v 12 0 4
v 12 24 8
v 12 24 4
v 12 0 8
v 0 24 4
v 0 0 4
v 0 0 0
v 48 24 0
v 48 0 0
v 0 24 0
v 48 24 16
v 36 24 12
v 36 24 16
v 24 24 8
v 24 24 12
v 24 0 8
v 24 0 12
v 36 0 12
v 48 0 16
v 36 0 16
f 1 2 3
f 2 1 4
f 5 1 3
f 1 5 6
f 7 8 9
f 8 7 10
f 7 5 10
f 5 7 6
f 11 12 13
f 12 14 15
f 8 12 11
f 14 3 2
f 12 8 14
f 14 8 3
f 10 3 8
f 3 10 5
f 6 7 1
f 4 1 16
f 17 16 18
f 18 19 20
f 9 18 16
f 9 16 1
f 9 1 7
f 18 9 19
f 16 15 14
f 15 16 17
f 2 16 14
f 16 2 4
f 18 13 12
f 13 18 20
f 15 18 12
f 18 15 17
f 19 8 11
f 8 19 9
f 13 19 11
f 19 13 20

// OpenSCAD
// SPDX-License-Identifier: CC-BY-4.0
// Original design: OpenPrintLab contributors. Units: mm.
// Generated inspection snapshot; edit models/recipes.py and catalog.json to customize.
// https://github.com/Prashanth261993/OpenPrintLab
union() {
  translate([0.000000, 0.000000, 0.000000]) cube([12.000000, 24.000000, 4.000000]);
  translate([12.000000, 0.000000, 0.000000]) cube([12.000000, 24.000000, 8.000000]);
  translate([24.000000, 0.000000, 0.000000]) cube([12.000000, 24.000000, 12.000000]);
  translate([36.000000, 0.000000, 0.000000]) cube([12.000000, 24.000000, 16.000000]);
}
